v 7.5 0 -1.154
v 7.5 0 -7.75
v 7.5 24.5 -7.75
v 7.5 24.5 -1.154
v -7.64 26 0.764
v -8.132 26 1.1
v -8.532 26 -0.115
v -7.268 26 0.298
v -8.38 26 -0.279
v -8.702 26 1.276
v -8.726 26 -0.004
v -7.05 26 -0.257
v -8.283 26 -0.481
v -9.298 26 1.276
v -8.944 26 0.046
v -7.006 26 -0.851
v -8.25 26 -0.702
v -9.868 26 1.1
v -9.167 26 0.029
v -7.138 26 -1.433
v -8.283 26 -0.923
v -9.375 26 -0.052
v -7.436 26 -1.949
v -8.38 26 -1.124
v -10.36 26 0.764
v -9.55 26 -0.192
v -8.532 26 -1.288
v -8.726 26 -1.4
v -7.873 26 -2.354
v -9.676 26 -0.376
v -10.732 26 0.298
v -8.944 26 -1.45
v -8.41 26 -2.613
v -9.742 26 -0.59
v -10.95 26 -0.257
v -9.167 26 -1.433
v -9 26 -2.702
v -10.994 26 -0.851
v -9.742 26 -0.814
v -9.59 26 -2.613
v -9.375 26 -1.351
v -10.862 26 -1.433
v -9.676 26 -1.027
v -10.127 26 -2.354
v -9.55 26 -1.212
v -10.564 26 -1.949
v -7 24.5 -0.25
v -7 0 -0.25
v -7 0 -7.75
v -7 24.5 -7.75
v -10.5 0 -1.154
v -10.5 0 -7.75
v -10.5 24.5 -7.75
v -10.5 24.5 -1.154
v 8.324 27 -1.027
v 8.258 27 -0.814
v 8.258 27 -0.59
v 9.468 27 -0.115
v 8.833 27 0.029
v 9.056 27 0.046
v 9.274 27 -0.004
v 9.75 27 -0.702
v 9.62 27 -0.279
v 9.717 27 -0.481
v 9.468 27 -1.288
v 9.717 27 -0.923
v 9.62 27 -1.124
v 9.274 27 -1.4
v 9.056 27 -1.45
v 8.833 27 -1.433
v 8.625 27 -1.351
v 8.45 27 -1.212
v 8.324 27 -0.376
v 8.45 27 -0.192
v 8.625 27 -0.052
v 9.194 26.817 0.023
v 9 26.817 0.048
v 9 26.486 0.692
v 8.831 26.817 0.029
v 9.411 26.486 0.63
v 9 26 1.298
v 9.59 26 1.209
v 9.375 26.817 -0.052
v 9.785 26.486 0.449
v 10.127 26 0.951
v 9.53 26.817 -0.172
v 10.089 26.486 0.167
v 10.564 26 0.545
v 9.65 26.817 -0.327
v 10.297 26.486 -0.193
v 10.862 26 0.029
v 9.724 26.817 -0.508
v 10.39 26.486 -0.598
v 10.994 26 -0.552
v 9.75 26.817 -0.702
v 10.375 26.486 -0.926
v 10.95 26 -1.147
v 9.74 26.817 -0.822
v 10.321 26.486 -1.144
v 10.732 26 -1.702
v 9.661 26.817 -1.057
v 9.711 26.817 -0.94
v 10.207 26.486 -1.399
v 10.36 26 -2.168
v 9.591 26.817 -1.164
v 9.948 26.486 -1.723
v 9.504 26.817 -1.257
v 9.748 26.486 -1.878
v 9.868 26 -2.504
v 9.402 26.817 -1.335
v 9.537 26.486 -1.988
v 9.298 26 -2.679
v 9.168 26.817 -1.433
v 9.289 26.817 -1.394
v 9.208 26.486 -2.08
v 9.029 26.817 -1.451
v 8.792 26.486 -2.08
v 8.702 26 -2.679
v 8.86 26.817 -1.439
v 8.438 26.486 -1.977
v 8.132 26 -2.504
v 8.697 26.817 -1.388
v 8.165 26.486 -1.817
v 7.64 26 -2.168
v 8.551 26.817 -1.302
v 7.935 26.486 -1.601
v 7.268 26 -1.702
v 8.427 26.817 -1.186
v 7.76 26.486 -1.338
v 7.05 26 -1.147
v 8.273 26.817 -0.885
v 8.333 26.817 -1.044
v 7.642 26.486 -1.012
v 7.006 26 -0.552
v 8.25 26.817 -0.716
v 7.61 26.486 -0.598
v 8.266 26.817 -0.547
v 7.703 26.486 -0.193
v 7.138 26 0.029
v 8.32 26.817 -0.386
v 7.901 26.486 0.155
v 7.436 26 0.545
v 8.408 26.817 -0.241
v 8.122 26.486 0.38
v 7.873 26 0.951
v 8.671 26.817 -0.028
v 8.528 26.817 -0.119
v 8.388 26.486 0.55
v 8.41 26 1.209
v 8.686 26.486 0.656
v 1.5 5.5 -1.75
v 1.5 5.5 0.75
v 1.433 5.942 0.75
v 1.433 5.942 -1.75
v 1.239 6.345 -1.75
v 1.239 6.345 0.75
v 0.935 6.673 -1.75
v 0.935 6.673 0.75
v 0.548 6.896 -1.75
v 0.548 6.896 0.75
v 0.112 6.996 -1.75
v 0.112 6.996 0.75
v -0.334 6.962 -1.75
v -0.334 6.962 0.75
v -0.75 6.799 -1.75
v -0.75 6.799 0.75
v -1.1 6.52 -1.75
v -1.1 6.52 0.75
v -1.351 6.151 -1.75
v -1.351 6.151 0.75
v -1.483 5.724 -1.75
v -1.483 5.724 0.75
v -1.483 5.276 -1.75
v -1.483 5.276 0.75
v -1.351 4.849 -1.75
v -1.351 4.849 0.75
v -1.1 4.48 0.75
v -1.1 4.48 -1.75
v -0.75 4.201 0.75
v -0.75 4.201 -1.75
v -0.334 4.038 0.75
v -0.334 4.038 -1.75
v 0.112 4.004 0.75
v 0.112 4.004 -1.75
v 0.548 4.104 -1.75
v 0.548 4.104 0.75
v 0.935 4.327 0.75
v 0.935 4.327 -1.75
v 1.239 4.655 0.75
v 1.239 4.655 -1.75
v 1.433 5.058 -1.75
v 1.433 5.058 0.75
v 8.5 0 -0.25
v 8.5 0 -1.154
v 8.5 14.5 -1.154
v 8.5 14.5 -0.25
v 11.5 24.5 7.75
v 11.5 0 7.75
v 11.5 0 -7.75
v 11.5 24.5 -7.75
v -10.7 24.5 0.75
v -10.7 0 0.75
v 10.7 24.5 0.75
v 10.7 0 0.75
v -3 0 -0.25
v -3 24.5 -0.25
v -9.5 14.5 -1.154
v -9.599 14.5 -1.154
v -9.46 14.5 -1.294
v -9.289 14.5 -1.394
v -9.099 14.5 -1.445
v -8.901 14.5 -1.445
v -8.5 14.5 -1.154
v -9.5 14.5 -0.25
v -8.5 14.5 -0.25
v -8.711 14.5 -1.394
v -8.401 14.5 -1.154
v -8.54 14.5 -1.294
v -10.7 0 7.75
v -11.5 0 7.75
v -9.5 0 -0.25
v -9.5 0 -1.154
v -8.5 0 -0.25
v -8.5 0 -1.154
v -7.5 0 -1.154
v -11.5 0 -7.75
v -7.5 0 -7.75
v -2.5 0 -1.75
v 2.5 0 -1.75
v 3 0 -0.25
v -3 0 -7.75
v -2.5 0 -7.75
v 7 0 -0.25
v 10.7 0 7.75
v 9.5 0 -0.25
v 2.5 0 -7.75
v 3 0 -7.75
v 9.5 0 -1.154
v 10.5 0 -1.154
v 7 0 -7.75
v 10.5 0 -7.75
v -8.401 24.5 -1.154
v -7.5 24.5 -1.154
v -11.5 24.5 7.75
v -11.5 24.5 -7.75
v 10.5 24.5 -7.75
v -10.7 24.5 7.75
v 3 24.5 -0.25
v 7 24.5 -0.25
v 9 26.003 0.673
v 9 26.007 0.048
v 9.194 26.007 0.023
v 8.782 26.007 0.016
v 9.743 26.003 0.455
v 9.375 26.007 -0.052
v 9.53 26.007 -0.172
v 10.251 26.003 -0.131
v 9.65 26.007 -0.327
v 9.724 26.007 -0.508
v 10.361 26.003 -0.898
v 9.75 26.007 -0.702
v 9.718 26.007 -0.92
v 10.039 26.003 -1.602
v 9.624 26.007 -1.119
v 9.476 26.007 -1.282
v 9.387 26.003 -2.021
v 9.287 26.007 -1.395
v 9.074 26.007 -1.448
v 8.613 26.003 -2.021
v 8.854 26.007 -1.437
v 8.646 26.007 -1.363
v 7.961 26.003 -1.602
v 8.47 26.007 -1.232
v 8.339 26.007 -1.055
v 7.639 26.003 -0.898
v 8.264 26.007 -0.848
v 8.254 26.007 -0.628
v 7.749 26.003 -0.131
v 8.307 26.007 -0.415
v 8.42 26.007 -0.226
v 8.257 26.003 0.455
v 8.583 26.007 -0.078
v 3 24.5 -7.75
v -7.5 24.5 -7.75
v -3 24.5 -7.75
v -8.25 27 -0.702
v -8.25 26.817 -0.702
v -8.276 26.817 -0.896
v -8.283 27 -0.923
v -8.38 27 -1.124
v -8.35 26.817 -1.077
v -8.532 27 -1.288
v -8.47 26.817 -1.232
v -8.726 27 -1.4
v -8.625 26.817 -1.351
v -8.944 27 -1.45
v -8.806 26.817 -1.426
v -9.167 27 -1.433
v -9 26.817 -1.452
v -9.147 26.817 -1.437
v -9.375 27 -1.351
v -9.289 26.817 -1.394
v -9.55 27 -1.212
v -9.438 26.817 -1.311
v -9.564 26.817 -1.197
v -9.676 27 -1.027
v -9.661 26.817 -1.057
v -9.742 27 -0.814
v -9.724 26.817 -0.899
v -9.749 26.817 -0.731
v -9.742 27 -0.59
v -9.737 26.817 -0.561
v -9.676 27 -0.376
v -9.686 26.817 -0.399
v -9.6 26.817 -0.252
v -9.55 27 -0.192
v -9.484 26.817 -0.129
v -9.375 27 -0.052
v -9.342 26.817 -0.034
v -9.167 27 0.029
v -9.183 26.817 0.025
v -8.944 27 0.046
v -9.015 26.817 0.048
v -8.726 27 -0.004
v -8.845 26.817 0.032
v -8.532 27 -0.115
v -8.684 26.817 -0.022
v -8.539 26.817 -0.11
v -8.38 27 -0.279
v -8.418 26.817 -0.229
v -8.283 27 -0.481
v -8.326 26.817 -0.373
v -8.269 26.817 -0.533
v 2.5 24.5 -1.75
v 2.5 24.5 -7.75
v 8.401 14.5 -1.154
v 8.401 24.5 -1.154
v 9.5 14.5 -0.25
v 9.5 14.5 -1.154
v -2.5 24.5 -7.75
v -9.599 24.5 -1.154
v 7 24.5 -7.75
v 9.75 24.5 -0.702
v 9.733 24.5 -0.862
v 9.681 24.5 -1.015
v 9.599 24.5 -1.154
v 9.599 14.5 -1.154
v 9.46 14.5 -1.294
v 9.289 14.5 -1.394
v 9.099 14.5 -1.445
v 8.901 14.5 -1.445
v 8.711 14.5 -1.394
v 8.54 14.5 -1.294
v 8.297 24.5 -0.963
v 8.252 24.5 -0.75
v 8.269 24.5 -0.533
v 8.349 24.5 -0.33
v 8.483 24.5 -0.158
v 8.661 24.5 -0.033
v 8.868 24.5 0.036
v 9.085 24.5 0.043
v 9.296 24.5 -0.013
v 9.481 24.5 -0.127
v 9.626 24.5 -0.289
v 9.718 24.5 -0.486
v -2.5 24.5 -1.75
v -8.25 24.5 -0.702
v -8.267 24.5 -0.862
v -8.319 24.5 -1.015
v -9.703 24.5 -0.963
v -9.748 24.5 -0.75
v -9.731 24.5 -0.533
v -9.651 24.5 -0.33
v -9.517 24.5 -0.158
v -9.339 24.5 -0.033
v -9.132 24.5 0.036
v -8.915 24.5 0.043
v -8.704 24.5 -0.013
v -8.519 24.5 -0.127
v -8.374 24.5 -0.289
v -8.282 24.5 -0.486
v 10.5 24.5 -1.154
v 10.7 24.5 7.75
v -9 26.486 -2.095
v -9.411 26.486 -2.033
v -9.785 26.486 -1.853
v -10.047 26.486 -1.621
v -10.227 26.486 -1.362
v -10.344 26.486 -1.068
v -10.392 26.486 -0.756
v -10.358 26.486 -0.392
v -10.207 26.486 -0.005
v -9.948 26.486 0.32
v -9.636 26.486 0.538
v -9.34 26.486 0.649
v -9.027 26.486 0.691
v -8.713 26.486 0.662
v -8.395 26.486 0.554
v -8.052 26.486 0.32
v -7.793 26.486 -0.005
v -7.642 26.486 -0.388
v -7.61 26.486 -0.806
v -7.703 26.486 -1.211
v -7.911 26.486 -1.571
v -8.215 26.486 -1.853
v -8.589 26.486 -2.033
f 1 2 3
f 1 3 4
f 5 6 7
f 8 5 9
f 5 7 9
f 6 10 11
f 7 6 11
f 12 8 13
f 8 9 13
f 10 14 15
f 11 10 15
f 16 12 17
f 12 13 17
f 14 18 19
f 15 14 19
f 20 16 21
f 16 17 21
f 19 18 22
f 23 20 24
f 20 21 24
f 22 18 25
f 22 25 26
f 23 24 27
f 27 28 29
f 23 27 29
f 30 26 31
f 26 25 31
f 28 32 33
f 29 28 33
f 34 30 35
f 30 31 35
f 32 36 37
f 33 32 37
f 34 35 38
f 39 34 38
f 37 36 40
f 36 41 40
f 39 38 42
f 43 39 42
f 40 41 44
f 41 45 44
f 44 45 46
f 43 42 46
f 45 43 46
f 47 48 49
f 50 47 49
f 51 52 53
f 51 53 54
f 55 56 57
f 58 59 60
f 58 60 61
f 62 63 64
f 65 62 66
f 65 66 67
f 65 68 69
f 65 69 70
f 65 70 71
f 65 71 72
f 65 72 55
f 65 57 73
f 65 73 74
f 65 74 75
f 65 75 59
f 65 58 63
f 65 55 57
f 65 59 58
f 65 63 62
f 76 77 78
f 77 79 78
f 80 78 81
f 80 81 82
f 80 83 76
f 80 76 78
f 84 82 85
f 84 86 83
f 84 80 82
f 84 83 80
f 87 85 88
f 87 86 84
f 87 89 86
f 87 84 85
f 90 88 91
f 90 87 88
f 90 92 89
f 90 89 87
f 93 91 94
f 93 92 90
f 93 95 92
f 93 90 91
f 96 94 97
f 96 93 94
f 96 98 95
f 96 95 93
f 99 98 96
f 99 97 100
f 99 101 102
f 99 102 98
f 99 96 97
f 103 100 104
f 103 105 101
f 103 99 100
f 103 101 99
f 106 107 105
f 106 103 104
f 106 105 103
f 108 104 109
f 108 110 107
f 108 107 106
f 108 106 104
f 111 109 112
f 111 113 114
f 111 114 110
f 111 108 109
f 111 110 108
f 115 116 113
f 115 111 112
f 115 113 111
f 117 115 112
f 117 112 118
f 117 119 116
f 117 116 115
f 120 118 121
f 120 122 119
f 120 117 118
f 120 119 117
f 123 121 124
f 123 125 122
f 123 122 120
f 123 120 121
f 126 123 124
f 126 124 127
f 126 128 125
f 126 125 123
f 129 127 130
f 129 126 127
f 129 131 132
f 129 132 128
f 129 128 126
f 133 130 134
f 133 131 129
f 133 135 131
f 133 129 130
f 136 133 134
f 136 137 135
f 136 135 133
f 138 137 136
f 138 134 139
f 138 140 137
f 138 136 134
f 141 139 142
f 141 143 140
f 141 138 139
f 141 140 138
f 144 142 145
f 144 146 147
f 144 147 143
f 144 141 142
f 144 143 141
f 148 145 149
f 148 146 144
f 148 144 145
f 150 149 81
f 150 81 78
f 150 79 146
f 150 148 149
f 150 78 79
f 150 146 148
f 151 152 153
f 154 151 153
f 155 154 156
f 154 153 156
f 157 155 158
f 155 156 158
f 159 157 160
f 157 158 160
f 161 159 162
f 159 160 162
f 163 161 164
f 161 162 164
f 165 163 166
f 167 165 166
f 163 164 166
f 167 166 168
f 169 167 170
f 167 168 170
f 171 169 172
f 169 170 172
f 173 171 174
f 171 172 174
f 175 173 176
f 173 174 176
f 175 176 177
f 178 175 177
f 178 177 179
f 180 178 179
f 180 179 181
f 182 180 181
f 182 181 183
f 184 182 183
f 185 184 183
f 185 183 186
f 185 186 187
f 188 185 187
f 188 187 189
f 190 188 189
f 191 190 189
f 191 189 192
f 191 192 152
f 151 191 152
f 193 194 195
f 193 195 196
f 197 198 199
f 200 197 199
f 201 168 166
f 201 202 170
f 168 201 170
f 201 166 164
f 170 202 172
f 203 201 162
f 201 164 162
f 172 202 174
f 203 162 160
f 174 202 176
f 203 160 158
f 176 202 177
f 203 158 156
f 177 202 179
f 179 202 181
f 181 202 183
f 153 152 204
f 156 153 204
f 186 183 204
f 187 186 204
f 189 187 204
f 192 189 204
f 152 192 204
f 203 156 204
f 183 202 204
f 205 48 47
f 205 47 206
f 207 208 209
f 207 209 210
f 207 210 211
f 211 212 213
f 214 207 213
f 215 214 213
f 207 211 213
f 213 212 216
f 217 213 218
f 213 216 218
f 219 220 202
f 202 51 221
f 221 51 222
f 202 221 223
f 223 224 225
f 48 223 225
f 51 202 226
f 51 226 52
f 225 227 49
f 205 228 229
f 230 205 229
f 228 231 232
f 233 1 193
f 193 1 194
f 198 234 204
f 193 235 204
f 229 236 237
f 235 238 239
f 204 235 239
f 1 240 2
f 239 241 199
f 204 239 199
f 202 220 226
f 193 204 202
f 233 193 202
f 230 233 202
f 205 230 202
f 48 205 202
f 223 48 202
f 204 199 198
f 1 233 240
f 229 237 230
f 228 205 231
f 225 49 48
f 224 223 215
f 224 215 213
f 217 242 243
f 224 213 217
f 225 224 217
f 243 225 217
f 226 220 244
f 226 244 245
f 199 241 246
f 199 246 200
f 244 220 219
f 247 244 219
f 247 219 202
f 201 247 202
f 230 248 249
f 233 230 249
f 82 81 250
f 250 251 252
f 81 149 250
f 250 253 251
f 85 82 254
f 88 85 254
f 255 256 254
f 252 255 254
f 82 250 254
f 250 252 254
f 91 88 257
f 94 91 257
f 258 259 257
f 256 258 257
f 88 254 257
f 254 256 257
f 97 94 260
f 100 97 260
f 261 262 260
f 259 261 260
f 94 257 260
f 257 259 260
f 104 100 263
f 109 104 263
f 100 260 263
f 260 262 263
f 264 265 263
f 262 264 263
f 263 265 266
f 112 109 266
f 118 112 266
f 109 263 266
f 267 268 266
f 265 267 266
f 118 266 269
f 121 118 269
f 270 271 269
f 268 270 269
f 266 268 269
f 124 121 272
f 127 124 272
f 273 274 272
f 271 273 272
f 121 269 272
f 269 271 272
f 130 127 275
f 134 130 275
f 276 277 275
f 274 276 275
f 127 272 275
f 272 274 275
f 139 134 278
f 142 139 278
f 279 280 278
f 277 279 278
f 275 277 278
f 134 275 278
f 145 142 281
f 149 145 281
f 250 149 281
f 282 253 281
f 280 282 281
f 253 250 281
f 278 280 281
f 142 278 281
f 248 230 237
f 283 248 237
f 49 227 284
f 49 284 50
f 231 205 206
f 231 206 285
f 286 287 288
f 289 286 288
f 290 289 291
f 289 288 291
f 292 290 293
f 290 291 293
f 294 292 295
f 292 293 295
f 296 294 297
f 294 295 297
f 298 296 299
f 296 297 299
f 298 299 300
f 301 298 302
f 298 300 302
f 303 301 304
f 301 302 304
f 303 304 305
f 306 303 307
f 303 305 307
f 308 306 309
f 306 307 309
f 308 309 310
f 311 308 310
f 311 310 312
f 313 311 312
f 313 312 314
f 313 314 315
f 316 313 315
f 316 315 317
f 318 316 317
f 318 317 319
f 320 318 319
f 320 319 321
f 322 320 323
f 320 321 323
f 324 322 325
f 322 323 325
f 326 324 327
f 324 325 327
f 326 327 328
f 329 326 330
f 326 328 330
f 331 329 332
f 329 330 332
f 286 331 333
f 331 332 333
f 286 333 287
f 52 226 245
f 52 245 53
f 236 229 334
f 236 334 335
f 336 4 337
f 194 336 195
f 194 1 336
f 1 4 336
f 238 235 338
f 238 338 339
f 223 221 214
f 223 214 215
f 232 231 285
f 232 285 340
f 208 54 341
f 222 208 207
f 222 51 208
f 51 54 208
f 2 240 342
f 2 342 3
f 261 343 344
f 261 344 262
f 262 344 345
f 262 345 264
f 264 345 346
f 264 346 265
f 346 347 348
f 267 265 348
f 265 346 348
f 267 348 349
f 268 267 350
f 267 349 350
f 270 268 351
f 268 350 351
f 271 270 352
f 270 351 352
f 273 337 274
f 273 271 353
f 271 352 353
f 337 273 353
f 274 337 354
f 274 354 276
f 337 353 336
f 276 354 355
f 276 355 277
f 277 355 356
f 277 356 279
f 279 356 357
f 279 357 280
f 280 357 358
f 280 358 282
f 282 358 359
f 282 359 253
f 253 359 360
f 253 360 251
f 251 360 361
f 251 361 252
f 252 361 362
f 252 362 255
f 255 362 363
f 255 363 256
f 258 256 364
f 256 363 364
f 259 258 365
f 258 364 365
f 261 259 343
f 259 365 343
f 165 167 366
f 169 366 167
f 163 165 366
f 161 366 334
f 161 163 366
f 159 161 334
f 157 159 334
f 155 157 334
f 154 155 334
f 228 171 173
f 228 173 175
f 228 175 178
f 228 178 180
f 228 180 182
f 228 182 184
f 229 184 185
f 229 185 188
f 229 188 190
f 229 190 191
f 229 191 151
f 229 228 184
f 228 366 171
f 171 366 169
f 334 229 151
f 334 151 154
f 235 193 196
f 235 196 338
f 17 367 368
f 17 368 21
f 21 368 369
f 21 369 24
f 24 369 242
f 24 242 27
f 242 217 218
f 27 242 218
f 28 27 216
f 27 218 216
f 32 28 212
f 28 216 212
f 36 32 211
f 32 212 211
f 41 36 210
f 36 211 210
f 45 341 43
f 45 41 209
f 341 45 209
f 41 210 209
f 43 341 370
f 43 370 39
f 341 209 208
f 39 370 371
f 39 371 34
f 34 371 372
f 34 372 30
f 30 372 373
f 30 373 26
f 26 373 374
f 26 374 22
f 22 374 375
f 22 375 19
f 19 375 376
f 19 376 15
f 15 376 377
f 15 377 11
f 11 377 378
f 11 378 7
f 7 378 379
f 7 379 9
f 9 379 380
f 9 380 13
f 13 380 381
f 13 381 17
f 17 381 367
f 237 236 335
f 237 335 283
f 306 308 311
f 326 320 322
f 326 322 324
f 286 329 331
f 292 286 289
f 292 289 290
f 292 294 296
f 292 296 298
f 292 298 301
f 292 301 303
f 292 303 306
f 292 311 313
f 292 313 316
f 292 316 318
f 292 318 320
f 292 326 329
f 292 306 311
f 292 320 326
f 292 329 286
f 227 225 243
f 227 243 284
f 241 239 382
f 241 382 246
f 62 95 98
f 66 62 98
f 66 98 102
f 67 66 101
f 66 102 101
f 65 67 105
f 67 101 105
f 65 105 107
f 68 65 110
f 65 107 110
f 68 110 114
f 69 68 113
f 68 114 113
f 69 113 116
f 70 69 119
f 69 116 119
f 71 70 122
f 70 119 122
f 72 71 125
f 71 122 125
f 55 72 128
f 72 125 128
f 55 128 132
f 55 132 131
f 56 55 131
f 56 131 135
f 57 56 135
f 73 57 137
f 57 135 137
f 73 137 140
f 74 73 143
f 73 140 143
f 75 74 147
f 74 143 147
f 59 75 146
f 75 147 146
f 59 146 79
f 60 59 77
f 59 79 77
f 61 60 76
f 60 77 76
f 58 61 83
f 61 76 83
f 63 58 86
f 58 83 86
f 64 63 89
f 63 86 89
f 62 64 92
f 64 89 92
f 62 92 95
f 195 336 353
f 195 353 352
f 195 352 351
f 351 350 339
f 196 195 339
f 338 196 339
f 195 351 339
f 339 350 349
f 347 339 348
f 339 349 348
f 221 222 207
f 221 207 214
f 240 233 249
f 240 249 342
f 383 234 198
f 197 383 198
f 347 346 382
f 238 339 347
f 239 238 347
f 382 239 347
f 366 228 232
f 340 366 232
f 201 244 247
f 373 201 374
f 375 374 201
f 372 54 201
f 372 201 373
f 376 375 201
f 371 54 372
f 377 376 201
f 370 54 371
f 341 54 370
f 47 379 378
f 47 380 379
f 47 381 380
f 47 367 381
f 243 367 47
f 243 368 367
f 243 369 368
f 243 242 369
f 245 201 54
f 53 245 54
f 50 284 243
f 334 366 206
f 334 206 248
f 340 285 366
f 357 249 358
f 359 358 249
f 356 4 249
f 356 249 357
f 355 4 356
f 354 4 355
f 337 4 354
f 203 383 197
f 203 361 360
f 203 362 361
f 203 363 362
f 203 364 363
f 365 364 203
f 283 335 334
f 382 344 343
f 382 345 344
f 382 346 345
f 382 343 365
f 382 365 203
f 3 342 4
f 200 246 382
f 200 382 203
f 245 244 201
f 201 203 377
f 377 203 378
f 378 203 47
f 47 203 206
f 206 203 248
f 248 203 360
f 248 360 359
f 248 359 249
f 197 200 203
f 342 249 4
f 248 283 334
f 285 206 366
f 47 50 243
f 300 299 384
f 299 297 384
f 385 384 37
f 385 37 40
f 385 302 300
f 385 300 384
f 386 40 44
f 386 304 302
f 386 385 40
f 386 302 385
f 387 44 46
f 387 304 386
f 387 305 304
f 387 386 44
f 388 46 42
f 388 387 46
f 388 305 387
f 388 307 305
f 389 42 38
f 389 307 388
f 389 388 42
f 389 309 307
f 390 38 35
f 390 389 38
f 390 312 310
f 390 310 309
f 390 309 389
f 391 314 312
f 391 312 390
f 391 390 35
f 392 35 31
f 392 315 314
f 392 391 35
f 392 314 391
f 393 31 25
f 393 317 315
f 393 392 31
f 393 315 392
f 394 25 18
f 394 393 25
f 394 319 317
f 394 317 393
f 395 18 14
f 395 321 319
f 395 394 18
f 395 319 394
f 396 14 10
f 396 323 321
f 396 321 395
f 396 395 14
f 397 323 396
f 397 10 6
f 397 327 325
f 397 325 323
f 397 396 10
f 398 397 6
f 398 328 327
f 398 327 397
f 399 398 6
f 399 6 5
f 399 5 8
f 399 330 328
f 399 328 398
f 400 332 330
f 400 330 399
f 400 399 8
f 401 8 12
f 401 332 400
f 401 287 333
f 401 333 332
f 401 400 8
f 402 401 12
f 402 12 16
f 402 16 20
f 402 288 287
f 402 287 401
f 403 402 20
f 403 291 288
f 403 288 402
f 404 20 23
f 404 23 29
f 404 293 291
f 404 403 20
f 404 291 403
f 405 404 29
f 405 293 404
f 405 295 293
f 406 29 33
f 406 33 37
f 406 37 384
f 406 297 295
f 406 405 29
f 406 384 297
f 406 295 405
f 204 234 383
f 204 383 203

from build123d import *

# Parameters (mm, degrees)
IZIM1_W                          = 23
IZIM1_H                          = 15.5
Y_KSEKLIK_EKSTR_ZYON1_DEPTH      = 24.5
IZIM2_W                          = 21.4
IZIM2_H                          = 7
IZIM2_W_2                        = 5
IZIM2_H_2                        = 6
IZIM2_W_3                        = 4
IZIM2_H_3                        = 7.5
KES_EKSTR_ZYON1_DEPTH            = 24.5
IZIM3_R                          = 0.75
Y_KSEKLIK_EKSTR_ZYON4_DEPTH      = 2.5
Y_KSEKLIK_EKSTR_ZYON4_DEPTH_BACK = 10
IZIM8_R                          = 1.5
KES_EKSTR_ZYON3_DEPTH            = 10


with BuildPart() as part:
    # Çizim1 → Yükseklik-Ekstrüzyon1 (new body)
    with BuildSketch(Plane(origin=(0, 0, 0), x_dir=(1, 0, 0), z_dir=(0, 1, 0))):
        Rectangle(IZIM1_W, IZIM1_H)
    extrude(amount=Y_KSEKLIK_EKSTR_ZYON1_DEPTH)

    # Çizim2 → Kes-Ekstrüzyon1 (cut)
    with BuildSketch(Plane(origin=(0, 0, 0), x_dir=(1, 0, 0), z_dir=(0, 1, 0))):
        with Locations((0, -4.25)):
            Rectangle(IZIM2_W, IZIM2_H)
        Polygon((-8.5, 1.153663729), (-7.5, 1.153663729), (-7.5, 7.75), (-10.5, 7.75), (-10.5, 1.153663729), (-9.5, 1.153663729), (-9.5, 0.25), (-8.5, 0.25), align=None)
        with Locations((0, 4.75)):
            Rectangle(IZIM2_W_2, IZIM2_H_2)
        with Locations((-5, 4)):
            Rectangle(IZIM2_W_3, IZIM2_H_3)
        with Locations((5, 4)):
            Rectangle(IZIM2_W_3, IZIM2_H_3)
        Polygon((10.5, 7.75), (7.5, 7.75), (7.5, 1.153663729), (8.5, 1.153663729), (8.5, 0.25), (9.5, 0.25), (9.5, 1.153663729), (10.5, 1.153663729), align=None)
    extrude(amount=KES_EKSTR_ZYON1_DEPTH, mode=Mode.SUBTRACT)

    # Çizim3 → Yükseklik-Ekstrüzyon4 (add, two sides)
    with BuildSketch(Plane(origin=(0, 24.5, 0), x_dir=(1, 0, 0), z_dir=(0, 1, 0))) as y_kseklik_ekstr_zyon4_sk:
        with Locations((-9, 0.701831864)):
            Circle(IZIM3_R)
        with Locations((9, 0.701831864)):
            Circle(IZIM3_R)
    extrude(amount=Y_KSEKLIK_EKSTR_ZYON4_DEPTH)
    extrude(y_kseklik_ekstr_zyon4_sk.sketch, amount=-Y_KSEKLIK_EKSTR_ZYON4_DEPTH_BACK)

    # Çizim5 → Döndür2 (revolve)
    with BuildSketch(Plane.ZY.offset(9)):
        with BuildLine():
            Line((-2.701831864, 26), (-0.701831864, 26))
            Line((-0.701831864, 26), (-0.701831864, 27))
            add(Edge.make_bspline(
                [(-2.701831864, 26), (-1.790219679, 26.874416791), (-0.701831864, 27)],
                knots=[0, 0, 0, 0.748833581, 0.748833581, 0.748833581], degree=2))
        make_face()
    revolve(axis=Axis((-9, 26, -0.701831864), (0, 1, 0)))

    # Çizim6 → Döndür3 (revolve)
    with BuildSketch(Plane(origin=(9, 0, 0), x_dir=(0, 0, -1), z_dir=(1, 0, 0))):
        with BuildLine():
            Line((-1.298168136, 26), (0.701831864, 26.01043139))
            Line((0.701831864, 26.01043139), (0.701831864, 27))
            add(Edge.make_bspline(
                [(-1.298168136, 26), (-0.38655595, 26.874416791), (0.701831864, 27)],
                knots=[0, 0, 0, 0.748833581, 0.748833581, 0.748833581], degree=2))
        make_face()
    revolve(axis=Axis((9, 26.01043139, -0.701831864), (0, 1, 0)))

    # Çizim8 → Kes-Ekstrüzyon3 (cut)
    with BuildSketch(Plane.XY.offset(0.75)):
        with Locations((0, 5.5)):
            Circle(IZIM8_R)
    extrude(amount=-KES_EKSTR_ZYON3_DEPTH, mode=Mode.SUBTRACT)


solid = part.part
